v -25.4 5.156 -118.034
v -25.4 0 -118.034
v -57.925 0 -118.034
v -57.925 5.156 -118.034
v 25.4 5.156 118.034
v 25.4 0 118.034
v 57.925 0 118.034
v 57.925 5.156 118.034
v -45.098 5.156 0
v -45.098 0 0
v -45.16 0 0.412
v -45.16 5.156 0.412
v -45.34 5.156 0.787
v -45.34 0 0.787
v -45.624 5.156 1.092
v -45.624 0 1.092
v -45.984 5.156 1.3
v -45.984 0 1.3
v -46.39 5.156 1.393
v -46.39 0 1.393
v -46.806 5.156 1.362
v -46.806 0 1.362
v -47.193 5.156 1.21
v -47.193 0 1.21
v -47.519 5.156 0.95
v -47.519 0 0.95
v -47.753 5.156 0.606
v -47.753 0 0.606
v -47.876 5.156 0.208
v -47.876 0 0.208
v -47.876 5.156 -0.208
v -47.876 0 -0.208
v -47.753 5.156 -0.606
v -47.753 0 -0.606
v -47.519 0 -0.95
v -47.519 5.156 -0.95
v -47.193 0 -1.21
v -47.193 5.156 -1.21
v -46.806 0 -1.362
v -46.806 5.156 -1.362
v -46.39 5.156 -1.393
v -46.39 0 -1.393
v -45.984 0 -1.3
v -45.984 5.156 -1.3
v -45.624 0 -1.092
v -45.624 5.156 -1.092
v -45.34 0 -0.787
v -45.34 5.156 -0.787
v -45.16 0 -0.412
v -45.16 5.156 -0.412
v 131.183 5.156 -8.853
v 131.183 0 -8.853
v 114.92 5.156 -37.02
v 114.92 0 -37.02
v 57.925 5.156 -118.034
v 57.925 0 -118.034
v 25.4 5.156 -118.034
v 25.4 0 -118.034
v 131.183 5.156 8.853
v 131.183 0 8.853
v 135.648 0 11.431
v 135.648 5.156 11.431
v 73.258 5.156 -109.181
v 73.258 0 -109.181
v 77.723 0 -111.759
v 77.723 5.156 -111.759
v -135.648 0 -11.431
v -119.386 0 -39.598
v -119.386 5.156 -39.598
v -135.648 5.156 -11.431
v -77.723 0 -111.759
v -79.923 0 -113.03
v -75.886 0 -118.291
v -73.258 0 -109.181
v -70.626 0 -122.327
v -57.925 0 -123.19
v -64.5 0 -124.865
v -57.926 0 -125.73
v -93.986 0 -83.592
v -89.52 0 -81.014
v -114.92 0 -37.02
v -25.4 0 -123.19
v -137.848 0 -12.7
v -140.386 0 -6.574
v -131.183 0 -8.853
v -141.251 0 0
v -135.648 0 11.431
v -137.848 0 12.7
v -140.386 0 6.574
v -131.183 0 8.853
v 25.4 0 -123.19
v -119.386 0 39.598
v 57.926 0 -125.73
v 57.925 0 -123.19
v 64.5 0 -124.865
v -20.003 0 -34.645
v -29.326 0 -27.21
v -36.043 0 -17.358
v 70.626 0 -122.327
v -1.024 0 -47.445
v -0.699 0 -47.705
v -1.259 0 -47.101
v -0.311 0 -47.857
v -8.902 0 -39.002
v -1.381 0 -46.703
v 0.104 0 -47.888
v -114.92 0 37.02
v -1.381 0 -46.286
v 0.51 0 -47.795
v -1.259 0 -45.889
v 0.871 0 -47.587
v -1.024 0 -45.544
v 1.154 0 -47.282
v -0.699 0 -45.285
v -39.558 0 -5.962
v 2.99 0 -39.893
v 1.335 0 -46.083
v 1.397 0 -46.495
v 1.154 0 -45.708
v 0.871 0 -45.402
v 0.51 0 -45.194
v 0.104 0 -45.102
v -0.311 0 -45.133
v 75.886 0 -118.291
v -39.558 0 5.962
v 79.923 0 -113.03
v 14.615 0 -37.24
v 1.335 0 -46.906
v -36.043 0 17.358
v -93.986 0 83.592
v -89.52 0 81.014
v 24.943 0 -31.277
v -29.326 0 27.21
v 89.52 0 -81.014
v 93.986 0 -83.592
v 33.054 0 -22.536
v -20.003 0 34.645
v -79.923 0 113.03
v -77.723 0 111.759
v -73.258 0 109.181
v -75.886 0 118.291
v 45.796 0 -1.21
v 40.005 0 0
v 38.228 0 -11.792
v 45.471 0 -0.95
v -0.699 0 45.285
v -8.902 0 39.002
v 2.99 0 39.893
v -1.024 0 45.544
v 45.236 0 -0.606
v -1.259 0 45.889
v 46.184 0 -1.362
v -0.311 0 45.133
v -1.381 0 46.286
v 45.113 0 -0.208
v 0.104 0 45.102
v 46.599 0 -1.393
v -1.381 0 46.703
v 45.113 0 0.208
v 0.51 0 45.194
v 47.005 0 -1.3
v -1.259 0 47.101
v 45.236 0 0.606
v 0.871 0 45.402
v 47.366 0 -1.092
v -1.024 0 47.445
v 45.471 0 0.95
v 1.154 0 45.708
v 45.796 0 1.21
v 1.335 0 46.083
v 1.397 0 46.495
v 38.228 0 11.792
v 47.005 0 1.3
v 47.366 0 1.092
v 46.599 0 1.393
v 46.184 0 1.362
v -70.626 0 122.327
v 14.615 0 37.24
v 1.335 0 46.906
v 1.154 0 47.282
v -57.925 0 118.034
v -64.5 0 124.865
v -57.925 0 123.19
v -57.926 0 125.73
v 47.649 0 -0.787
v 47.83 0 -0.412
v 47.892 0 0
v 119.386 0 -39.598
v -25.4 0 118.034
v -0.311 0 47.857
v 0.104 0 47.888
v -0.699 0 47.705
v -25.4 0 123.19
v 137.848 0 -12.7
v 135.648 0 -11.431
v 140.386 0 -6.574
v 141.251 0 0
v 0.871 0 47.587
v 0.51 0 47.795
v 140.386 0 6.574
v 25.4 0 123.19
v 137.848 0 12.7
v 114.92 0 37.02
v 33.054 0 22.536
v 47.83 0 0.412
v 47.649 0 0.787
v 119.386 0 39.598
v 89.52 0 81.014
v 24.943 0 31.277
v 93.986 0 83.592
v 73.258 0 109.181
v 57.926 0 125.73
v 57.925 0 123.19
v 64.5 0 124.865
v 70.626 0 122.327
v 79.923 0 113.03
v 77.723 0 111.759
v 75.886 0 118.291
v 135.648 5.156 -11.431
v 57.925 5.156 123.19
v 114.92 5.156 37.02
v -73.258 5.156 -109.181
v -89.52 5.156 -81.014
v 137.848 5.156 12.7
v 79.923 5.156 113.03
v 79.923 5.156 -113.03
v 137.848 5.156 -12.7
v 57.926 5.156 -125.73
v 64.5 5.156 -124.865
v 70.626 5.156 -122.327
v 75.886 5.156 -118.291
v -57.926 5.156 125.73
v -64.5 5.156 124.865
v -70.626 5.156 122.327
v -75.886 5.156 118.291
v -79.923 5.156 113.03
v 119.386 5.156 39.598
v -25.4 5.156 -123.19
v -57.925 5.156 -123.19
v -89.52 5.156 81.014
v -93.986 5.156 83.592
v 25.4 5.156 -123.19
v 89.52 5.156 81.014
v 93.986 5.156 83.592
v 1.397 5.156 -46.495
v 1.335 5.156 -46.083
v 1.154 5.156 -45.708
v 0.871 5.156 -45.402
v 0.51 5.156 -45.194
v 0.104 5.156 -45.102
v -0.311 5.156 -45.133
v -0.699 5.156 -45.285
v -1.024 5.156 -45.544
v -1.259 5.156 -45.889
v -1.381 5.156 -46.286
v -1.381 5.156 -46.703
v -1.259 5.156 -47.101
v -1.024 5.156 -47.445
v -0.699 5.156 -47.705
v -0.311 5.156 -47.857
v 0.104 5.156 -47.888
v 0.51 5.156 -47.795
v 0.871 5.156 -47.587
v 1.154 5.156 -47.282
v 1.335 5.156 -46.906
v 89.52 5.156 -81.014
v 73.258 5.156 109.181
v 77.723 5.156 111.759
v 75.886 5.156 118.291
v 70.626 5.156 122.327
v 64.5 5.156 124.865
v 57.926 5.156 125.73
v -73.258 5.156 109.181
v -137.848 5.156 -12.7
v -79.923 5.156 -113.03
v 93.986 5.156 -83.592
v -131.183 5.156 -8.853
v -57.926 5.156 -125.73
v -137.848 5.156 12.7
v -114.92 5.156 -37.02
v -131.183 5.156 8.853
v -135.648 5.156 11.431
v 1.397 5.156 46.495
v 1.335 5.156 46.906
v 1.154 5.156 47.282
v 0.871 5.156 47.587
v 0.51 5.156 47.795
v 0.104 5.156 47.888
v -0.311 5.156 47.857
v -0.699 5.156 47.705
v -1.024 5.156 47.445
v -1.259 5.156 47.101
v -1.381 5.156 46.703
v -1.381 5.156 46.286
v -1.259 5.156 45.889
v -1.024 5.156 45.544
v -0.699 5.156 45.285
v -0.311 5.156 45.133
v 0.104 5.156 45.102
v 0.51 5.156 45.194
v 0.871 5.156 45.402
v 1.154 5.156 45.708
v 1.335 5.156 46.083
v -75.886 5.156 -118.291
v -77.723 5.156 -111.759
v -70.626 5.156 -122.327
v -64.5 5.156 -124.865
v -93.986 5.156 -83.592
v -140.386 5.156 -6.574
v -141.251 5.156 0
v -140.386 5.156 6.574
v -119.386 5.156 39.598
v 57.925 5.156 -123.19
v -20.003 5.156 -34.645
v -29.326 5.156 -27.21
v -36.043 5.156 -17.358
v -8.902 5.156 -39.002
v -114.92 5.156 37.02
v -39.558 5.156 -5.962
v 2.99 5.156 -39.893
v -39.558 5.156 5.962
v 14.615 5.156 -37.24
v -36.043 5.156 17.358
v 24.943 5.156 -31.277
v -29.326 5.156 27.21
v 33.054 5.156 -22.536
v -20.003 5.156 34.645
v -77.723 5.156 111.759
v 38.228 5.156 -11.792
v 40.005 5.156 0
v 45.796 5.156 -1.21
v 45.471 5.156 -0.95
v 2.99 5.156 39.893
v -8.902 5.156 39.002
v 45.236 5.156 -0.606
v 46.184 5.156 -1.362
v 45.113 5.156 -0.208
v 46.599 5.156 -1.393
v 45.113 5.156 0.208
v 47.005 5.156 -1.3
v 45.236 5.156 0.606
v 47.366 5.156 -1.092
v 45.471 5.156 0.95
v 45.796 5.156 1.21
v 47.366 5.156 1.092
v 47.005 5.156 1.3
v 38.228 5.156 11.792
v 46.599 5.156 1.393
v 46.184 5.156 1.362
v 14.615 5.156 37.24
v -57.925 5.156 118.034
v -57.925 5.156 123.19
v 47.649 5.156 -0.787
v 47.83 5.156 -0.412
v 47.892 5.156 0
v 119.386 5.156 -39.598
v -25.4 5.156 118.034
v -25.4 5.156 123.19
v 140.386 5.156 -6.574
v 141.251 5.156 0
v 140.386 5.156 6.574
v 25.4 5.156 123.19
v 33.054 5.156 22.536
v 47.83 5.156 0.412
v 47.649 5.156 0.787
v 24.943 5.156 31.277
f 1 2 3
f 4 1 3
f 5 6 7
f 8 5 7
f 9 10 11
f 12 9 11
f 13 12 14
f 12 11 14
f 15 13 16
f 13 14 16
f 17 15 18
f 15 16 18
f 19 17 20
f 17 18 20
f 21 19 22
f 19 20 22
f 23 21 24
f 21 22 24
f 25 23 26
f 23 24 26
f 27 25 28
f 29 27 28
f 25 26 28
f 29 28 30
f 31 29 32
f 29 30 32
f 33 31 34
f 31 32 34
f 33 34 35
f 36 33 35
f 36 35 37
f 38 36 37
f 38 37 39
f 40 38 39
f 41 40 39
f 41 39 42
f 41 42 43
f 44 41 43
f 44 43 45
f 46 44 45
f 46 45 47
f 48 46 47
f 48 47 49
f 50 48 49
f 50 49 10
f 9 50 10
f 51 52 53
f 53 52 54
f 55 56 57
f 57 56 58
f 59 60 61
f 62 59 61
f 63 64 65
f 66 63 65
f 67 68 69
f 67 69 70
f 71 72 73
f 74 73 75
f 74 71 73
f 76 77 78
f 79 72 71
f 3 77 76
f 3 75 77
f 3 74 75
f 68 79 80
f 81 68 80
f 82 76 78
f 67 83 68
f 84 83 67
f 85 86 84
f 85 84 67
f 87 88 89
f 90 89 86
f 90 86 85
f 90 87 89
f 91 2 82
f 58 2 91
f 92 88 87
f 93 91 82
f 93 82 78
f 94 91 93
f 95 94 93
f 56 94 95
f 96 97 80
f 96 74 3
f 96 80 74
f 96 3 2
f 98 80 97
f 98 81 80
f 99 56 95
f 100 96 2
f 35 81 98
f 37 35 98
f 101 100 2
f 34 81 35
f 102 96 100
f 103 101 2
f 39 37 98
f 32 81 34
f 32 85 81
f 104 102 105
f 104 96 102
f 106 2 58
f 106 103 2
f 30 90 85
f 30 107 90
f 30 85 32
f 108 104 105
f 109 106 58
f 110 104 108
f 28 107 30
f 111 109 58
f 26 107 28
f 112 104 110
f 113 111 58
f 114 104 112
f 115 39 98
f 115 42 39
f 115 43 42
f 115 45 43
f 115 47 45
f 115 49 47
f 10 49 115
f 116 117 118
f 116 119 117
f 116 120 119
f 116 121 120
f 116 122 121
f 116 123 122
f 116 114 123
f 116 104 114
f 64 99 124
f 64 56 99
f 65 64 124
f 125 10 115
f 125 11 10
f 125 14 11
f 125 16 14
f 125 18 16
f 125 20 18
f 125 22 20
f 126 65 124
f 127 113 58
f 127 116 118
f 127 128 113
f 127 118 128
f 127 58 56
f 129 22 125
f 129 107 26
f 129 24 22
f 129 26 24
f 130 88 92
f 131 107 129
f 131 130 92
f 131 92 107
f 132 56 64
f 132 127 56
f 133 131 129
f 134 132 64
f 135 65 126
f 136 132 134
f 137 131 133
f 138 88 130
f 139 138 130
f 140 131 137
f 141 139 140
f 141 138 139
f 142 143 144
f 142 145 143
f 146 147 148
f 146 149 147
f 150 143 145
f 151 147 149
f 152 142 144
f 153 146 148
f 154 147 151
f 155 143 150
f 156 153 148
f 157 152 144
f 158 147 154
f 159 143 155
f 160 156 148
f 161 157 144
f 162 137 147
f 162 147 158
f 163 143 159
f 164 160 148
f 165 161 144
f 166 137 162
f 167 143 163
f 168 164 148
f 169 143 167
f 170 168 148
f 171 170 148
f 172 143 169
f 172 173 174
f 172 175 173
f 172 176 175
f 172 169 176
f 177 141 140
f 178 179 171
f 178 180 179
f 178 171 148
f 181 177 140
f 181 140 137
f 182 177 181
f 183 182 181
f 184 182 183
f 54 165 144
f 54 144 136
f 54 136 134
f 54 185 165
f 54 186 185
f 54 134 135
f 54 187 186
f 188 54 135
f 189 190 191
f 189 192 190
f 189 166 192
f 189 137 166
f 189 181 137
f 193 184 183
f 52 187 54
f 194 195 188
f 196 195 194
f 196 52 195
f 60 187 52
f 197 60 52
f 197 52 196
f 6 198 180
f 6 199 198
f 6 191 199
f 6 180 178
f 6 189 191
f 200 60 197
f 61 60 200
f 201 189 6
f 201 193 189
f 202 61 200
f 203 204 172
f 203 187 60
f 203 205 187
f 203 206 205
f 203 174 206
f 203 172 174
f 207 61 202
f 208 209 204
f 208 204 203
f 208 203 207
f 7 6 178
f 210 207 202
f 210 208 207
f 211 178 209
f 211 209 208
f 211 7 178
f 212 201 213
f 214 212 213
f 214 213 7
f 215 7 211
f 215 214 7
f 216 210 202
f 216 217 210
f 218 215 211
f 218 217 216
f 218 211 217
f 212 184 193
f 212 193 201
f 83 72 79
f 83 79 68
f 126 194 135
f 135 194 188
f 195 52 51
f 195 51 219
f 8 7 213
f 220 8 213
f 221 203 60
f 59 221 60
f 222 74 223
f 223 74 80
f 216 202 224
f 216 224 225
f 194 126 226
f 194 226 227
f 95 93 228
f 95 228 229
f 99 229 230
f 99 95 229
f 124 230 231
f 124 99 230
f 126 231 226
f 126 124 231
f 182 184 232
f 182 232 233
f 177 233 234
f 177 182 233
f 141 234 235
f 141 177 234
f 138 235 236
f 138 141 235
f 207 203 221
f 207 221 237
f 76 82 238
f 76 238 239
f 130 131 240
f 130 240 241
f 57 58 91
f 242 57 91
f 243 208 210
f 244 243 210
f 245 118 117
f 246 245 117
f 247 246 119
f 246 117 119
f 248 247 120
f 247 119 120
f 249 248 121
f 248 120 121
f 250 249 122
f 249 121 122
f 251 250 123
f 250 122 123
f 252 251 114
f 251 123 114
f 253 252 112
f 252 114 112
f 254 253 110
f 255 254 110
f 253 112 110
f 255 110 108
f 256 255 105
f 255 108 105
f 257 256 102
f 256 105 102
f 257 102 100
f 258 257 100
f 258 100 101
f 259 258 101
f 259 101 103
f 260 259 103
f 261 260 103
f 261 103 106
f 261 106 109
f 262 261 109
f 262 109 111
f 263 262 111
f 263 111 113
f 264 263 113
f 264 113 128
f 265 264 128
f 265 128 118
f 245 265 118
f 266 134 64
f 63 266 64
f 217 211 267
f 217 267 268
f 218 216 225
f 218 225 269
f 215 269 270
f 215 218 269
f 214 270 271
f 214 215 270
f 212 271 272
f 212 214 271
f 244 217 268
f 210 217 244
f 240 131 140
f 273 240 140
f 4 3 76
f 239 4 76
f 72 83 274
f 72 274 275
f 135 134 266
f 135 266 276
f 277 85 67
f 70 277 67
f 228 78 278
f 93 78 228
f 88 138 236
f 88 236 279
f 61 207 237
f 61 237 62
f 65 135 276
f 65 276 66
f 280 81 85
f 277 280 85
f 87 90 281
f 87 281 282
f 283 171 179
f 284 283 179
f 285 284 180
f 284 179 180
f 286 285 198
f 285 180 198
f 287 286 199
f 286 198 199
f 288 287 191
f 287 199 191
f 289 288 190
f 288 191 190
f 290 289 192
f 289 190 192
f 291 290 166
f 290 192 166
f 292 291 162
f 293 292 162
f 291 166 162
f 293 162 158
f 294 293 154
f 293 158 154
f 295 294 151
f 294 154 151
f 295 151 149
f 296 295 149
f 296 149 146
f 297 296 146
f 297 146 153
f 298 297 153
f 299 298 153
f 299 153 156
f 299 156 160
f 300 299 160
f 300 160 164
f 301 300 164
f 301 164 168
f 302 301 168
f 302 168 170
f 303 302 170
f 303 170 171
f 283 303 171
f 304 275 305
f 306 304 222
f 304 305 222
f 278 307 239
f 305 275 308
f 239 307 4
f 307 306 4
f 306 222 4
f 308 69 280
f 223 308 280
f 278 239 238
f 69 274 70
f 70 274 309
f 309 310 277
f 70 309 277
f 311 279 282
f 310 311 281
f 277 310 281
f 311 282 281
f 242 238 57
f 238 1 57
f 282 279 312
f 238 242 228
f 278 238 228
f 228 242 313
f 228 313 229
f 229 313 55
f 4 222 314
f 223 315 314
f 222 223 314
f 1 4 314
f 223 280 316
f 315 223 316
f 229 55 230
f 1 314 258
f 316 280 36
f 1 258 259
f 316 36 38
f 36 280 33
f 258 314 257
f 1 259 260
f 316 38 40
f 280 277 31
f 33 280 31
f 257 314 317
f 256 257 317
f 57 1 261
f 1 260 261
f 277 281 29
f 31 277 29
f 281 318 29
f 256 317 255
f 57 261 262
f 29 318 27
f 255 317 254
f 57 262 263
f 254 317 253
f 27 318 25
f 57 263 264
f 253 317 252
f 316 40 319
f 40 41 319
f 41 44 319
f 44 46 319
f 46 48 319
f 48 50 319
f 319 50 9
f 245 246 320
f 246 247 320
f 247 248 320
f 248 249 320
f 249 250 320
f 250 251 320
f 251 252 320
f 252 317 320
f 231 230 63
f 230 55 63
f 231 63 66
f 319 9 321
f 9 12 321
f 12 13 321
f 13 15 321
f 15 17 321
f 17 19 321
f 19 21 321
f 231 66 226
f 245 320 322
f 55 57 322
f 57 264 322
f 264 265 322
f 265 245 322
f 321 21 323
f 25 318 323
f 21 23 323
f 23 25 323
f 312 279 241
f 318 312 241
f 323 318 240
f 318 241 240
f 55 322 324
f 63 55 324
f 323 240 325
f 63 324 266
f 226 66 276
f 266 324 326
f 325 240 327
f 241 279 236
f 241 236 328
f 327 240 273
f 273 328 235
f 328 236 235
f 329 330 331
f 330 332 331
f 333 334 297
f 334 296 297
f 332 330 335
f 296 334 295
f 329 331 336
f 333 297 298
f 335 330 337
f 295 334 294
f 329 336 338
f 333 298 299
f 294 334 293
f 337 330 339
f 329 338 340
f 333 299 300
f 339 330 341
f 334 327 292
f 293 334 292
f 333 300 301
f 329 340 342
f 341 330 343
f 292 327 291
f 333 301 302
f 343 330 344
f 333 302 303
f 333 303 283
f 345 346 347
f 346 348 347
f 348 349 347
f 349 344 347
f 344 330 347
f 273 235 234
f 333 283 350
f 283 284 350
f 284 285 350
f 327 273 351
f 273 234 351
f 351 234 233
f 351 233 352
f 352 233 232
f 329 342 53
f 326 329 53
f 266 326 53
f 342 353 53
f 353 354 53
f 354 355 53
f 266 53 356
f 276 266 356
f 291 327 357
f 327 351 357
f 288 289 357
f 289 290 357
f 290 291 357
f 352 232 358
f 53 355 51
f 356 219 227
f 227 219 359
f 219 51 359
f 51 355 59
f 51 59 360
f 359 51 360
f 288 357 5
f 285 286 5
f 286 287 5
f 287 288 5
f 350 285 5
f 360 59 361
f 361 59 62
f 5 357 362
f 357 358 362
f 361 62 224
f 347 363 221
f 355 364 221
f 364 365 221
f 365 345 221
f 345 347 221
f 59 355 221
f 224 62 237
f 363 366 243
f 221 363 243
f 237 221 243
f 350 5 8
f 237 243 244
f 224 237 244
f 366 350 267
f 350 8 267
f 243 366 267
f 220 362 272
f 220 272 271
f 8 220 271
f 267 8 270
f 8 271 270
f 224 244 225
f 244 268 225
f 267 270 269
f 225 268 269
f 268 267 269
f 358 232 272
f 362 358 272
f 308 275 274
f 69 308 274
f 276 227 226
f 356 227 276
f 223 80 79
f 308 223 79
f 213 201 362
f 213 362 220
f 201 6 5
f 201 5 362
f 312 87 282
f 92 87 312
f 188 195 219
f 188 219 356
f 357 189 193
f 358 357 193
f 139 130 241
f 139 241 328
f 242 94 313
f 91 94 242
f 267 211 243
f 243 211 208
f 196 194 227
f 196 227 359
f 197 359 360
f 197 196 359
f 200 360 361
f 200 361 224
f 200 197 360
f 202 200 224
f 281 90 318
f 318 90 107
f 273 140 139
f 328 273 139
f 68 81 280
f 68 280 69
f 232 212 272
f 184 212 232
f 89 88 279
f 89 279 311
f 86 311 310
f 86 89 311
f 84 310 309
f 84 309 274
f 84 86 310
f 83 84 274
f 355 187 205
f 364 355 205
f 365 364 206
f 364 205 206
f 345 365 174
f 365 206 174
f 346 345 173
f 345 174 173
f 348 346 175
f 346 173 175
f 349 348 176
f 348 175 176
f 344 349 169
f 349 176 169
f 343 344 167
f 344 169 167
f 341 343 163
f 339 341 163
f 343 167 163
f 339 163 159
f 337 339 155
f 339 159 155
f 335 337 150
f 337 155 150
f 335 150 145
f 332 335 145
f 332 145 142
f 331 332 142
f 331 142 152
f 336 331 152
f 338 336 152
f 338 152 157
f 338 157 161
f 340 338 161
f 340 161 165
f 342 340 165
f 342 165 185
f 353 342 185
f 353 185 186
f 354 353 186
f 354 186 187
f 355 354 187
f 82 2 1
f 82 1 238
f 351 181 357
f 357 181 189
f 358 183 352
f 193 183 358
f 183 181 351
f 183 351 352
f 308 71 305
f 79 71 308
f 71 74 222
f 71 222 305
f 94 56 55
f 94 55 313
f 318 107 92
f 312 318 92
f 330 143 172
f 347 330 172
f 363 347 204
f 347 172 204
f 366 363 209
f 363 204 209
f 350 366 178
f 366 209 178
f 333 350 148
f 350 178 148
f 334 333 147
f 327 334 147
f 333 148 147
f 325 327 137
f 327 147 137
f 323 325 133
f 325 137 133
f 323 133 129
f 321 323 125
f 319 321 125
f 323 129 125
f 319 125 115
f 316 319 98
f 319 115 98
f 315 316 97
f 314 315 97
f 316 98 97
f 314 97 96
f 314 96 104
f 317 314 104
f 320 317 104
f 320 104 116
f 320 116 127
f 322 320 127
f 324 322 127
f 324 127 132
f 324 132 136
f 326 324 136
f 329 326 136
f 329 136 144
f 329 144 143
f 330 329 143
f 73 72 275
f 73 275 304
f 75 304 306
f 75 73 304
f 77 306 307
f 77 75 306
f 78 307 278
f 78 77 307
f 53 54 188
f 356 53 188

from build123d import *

# Parameters (mm, degrees)
F1_DEPTH        = 5.1562
F2_R            = 40.005
F2_R_2          = 1.397
F3_DEPTH        = 5.1572
F4_W            = 32.5247
F4_H            = 5.1562
F5_DEPTH        = 5.1572
F5_COPIES_COUNT = 6


# Not quite as in the source:
# - a pattern or mirror of a feature is missing from the dataset's text; its kind, count and spacing are read off the source's solid


with BuildPart() as f1:
    # F0 (on Front) → F1 (new body)
    with BuildSketch(Plane.XZ):
        with BuildLine():
            Line((137.8481502717, 12.7), (79.9225977639, 113.03))
            ThreePointArc((79.9225977639, 113.03), (70.6255525078, 122.3270452561), (57.9255525078, 125.73))
            Line((57.9255525078, 125.73), (-57.9255525078, 125.73))
            ThreePointArc((-57.9255525078, 125.73), (-70.6255525078, 122.3270452561), (-79.9225977639, 113.03))
            Line((-79.9225977639, 113.03), (-137.8481502717, 12.7))
            ThreePointArc((-137.8481502717, 12.7), (-141.2511050156, 0), (-137.8481502717, -12.7))
            Line((-137.8481502717, -12.7), (-79.9225977639, -113.03))
            ThreePointArc((-79.9225977639, -113.03), (-70.6255525078, -122.3270452561), (-57.9255525078, -125.73))
            Line((-57.9255525078, -125.73), (57.9255525078, -125.73))
            ThreePointArc((57.9255525078, -125.73), (70.6255525078, -122.3270452561), (79.9225977639, -113.03))
            Line((79.9225977639, -113.03), (137.8481502717, -12.7))
            ThreePointArc((137.8481502717, -12.7), (141.2511050156, 0), (137.8481502717, 12.7))
        make_face()
    extrude(amount=-F1_DEPTH)

    # F2 (on face) → F3 (cut, through all)
    with BuildSketch(Plane.XZ):
        Circle(F2_R)
        with Locations((0, 46.4947)):
            Circle(F2_R_2)
        with Locations((-46.4947, 0)):
            Circle(F2_R_2)
        with Locations((0, -46.4947)):
            Circle(F2_R_2)
        with Locations((46.4947, 0)):
            Circle(F2_R_2)
    extrude(amount=-F3_DEPTH, mode=Mode.SUBTRACT)

    # F4 (on face) → F5 (cut, through all)
    with BuildSketch(Plane.XZ):
        with Locations((-41.66235, 120.6119)):
            Rectangle(F4_W, F4_H)
        with Locations((41.66235, 120.6119)):
            Rectangle(F4_W, F4_H)
    f5 = extrude(amount=-F5_DEPTH, mode=Mode.SUBTRACT)

    # F5_copies: F5 ×6 about axis
    f5_copies_axis = Axis((0, 0, 0), (0, 1, 0))
    for i in range(1, F5_COPIES_COUNT):
        add(f5.rotate(f5_copies_axis, i * 360 / F5_COPIES_COUNT), mode=Mode.SUBTRACT)


solid = f1.part
